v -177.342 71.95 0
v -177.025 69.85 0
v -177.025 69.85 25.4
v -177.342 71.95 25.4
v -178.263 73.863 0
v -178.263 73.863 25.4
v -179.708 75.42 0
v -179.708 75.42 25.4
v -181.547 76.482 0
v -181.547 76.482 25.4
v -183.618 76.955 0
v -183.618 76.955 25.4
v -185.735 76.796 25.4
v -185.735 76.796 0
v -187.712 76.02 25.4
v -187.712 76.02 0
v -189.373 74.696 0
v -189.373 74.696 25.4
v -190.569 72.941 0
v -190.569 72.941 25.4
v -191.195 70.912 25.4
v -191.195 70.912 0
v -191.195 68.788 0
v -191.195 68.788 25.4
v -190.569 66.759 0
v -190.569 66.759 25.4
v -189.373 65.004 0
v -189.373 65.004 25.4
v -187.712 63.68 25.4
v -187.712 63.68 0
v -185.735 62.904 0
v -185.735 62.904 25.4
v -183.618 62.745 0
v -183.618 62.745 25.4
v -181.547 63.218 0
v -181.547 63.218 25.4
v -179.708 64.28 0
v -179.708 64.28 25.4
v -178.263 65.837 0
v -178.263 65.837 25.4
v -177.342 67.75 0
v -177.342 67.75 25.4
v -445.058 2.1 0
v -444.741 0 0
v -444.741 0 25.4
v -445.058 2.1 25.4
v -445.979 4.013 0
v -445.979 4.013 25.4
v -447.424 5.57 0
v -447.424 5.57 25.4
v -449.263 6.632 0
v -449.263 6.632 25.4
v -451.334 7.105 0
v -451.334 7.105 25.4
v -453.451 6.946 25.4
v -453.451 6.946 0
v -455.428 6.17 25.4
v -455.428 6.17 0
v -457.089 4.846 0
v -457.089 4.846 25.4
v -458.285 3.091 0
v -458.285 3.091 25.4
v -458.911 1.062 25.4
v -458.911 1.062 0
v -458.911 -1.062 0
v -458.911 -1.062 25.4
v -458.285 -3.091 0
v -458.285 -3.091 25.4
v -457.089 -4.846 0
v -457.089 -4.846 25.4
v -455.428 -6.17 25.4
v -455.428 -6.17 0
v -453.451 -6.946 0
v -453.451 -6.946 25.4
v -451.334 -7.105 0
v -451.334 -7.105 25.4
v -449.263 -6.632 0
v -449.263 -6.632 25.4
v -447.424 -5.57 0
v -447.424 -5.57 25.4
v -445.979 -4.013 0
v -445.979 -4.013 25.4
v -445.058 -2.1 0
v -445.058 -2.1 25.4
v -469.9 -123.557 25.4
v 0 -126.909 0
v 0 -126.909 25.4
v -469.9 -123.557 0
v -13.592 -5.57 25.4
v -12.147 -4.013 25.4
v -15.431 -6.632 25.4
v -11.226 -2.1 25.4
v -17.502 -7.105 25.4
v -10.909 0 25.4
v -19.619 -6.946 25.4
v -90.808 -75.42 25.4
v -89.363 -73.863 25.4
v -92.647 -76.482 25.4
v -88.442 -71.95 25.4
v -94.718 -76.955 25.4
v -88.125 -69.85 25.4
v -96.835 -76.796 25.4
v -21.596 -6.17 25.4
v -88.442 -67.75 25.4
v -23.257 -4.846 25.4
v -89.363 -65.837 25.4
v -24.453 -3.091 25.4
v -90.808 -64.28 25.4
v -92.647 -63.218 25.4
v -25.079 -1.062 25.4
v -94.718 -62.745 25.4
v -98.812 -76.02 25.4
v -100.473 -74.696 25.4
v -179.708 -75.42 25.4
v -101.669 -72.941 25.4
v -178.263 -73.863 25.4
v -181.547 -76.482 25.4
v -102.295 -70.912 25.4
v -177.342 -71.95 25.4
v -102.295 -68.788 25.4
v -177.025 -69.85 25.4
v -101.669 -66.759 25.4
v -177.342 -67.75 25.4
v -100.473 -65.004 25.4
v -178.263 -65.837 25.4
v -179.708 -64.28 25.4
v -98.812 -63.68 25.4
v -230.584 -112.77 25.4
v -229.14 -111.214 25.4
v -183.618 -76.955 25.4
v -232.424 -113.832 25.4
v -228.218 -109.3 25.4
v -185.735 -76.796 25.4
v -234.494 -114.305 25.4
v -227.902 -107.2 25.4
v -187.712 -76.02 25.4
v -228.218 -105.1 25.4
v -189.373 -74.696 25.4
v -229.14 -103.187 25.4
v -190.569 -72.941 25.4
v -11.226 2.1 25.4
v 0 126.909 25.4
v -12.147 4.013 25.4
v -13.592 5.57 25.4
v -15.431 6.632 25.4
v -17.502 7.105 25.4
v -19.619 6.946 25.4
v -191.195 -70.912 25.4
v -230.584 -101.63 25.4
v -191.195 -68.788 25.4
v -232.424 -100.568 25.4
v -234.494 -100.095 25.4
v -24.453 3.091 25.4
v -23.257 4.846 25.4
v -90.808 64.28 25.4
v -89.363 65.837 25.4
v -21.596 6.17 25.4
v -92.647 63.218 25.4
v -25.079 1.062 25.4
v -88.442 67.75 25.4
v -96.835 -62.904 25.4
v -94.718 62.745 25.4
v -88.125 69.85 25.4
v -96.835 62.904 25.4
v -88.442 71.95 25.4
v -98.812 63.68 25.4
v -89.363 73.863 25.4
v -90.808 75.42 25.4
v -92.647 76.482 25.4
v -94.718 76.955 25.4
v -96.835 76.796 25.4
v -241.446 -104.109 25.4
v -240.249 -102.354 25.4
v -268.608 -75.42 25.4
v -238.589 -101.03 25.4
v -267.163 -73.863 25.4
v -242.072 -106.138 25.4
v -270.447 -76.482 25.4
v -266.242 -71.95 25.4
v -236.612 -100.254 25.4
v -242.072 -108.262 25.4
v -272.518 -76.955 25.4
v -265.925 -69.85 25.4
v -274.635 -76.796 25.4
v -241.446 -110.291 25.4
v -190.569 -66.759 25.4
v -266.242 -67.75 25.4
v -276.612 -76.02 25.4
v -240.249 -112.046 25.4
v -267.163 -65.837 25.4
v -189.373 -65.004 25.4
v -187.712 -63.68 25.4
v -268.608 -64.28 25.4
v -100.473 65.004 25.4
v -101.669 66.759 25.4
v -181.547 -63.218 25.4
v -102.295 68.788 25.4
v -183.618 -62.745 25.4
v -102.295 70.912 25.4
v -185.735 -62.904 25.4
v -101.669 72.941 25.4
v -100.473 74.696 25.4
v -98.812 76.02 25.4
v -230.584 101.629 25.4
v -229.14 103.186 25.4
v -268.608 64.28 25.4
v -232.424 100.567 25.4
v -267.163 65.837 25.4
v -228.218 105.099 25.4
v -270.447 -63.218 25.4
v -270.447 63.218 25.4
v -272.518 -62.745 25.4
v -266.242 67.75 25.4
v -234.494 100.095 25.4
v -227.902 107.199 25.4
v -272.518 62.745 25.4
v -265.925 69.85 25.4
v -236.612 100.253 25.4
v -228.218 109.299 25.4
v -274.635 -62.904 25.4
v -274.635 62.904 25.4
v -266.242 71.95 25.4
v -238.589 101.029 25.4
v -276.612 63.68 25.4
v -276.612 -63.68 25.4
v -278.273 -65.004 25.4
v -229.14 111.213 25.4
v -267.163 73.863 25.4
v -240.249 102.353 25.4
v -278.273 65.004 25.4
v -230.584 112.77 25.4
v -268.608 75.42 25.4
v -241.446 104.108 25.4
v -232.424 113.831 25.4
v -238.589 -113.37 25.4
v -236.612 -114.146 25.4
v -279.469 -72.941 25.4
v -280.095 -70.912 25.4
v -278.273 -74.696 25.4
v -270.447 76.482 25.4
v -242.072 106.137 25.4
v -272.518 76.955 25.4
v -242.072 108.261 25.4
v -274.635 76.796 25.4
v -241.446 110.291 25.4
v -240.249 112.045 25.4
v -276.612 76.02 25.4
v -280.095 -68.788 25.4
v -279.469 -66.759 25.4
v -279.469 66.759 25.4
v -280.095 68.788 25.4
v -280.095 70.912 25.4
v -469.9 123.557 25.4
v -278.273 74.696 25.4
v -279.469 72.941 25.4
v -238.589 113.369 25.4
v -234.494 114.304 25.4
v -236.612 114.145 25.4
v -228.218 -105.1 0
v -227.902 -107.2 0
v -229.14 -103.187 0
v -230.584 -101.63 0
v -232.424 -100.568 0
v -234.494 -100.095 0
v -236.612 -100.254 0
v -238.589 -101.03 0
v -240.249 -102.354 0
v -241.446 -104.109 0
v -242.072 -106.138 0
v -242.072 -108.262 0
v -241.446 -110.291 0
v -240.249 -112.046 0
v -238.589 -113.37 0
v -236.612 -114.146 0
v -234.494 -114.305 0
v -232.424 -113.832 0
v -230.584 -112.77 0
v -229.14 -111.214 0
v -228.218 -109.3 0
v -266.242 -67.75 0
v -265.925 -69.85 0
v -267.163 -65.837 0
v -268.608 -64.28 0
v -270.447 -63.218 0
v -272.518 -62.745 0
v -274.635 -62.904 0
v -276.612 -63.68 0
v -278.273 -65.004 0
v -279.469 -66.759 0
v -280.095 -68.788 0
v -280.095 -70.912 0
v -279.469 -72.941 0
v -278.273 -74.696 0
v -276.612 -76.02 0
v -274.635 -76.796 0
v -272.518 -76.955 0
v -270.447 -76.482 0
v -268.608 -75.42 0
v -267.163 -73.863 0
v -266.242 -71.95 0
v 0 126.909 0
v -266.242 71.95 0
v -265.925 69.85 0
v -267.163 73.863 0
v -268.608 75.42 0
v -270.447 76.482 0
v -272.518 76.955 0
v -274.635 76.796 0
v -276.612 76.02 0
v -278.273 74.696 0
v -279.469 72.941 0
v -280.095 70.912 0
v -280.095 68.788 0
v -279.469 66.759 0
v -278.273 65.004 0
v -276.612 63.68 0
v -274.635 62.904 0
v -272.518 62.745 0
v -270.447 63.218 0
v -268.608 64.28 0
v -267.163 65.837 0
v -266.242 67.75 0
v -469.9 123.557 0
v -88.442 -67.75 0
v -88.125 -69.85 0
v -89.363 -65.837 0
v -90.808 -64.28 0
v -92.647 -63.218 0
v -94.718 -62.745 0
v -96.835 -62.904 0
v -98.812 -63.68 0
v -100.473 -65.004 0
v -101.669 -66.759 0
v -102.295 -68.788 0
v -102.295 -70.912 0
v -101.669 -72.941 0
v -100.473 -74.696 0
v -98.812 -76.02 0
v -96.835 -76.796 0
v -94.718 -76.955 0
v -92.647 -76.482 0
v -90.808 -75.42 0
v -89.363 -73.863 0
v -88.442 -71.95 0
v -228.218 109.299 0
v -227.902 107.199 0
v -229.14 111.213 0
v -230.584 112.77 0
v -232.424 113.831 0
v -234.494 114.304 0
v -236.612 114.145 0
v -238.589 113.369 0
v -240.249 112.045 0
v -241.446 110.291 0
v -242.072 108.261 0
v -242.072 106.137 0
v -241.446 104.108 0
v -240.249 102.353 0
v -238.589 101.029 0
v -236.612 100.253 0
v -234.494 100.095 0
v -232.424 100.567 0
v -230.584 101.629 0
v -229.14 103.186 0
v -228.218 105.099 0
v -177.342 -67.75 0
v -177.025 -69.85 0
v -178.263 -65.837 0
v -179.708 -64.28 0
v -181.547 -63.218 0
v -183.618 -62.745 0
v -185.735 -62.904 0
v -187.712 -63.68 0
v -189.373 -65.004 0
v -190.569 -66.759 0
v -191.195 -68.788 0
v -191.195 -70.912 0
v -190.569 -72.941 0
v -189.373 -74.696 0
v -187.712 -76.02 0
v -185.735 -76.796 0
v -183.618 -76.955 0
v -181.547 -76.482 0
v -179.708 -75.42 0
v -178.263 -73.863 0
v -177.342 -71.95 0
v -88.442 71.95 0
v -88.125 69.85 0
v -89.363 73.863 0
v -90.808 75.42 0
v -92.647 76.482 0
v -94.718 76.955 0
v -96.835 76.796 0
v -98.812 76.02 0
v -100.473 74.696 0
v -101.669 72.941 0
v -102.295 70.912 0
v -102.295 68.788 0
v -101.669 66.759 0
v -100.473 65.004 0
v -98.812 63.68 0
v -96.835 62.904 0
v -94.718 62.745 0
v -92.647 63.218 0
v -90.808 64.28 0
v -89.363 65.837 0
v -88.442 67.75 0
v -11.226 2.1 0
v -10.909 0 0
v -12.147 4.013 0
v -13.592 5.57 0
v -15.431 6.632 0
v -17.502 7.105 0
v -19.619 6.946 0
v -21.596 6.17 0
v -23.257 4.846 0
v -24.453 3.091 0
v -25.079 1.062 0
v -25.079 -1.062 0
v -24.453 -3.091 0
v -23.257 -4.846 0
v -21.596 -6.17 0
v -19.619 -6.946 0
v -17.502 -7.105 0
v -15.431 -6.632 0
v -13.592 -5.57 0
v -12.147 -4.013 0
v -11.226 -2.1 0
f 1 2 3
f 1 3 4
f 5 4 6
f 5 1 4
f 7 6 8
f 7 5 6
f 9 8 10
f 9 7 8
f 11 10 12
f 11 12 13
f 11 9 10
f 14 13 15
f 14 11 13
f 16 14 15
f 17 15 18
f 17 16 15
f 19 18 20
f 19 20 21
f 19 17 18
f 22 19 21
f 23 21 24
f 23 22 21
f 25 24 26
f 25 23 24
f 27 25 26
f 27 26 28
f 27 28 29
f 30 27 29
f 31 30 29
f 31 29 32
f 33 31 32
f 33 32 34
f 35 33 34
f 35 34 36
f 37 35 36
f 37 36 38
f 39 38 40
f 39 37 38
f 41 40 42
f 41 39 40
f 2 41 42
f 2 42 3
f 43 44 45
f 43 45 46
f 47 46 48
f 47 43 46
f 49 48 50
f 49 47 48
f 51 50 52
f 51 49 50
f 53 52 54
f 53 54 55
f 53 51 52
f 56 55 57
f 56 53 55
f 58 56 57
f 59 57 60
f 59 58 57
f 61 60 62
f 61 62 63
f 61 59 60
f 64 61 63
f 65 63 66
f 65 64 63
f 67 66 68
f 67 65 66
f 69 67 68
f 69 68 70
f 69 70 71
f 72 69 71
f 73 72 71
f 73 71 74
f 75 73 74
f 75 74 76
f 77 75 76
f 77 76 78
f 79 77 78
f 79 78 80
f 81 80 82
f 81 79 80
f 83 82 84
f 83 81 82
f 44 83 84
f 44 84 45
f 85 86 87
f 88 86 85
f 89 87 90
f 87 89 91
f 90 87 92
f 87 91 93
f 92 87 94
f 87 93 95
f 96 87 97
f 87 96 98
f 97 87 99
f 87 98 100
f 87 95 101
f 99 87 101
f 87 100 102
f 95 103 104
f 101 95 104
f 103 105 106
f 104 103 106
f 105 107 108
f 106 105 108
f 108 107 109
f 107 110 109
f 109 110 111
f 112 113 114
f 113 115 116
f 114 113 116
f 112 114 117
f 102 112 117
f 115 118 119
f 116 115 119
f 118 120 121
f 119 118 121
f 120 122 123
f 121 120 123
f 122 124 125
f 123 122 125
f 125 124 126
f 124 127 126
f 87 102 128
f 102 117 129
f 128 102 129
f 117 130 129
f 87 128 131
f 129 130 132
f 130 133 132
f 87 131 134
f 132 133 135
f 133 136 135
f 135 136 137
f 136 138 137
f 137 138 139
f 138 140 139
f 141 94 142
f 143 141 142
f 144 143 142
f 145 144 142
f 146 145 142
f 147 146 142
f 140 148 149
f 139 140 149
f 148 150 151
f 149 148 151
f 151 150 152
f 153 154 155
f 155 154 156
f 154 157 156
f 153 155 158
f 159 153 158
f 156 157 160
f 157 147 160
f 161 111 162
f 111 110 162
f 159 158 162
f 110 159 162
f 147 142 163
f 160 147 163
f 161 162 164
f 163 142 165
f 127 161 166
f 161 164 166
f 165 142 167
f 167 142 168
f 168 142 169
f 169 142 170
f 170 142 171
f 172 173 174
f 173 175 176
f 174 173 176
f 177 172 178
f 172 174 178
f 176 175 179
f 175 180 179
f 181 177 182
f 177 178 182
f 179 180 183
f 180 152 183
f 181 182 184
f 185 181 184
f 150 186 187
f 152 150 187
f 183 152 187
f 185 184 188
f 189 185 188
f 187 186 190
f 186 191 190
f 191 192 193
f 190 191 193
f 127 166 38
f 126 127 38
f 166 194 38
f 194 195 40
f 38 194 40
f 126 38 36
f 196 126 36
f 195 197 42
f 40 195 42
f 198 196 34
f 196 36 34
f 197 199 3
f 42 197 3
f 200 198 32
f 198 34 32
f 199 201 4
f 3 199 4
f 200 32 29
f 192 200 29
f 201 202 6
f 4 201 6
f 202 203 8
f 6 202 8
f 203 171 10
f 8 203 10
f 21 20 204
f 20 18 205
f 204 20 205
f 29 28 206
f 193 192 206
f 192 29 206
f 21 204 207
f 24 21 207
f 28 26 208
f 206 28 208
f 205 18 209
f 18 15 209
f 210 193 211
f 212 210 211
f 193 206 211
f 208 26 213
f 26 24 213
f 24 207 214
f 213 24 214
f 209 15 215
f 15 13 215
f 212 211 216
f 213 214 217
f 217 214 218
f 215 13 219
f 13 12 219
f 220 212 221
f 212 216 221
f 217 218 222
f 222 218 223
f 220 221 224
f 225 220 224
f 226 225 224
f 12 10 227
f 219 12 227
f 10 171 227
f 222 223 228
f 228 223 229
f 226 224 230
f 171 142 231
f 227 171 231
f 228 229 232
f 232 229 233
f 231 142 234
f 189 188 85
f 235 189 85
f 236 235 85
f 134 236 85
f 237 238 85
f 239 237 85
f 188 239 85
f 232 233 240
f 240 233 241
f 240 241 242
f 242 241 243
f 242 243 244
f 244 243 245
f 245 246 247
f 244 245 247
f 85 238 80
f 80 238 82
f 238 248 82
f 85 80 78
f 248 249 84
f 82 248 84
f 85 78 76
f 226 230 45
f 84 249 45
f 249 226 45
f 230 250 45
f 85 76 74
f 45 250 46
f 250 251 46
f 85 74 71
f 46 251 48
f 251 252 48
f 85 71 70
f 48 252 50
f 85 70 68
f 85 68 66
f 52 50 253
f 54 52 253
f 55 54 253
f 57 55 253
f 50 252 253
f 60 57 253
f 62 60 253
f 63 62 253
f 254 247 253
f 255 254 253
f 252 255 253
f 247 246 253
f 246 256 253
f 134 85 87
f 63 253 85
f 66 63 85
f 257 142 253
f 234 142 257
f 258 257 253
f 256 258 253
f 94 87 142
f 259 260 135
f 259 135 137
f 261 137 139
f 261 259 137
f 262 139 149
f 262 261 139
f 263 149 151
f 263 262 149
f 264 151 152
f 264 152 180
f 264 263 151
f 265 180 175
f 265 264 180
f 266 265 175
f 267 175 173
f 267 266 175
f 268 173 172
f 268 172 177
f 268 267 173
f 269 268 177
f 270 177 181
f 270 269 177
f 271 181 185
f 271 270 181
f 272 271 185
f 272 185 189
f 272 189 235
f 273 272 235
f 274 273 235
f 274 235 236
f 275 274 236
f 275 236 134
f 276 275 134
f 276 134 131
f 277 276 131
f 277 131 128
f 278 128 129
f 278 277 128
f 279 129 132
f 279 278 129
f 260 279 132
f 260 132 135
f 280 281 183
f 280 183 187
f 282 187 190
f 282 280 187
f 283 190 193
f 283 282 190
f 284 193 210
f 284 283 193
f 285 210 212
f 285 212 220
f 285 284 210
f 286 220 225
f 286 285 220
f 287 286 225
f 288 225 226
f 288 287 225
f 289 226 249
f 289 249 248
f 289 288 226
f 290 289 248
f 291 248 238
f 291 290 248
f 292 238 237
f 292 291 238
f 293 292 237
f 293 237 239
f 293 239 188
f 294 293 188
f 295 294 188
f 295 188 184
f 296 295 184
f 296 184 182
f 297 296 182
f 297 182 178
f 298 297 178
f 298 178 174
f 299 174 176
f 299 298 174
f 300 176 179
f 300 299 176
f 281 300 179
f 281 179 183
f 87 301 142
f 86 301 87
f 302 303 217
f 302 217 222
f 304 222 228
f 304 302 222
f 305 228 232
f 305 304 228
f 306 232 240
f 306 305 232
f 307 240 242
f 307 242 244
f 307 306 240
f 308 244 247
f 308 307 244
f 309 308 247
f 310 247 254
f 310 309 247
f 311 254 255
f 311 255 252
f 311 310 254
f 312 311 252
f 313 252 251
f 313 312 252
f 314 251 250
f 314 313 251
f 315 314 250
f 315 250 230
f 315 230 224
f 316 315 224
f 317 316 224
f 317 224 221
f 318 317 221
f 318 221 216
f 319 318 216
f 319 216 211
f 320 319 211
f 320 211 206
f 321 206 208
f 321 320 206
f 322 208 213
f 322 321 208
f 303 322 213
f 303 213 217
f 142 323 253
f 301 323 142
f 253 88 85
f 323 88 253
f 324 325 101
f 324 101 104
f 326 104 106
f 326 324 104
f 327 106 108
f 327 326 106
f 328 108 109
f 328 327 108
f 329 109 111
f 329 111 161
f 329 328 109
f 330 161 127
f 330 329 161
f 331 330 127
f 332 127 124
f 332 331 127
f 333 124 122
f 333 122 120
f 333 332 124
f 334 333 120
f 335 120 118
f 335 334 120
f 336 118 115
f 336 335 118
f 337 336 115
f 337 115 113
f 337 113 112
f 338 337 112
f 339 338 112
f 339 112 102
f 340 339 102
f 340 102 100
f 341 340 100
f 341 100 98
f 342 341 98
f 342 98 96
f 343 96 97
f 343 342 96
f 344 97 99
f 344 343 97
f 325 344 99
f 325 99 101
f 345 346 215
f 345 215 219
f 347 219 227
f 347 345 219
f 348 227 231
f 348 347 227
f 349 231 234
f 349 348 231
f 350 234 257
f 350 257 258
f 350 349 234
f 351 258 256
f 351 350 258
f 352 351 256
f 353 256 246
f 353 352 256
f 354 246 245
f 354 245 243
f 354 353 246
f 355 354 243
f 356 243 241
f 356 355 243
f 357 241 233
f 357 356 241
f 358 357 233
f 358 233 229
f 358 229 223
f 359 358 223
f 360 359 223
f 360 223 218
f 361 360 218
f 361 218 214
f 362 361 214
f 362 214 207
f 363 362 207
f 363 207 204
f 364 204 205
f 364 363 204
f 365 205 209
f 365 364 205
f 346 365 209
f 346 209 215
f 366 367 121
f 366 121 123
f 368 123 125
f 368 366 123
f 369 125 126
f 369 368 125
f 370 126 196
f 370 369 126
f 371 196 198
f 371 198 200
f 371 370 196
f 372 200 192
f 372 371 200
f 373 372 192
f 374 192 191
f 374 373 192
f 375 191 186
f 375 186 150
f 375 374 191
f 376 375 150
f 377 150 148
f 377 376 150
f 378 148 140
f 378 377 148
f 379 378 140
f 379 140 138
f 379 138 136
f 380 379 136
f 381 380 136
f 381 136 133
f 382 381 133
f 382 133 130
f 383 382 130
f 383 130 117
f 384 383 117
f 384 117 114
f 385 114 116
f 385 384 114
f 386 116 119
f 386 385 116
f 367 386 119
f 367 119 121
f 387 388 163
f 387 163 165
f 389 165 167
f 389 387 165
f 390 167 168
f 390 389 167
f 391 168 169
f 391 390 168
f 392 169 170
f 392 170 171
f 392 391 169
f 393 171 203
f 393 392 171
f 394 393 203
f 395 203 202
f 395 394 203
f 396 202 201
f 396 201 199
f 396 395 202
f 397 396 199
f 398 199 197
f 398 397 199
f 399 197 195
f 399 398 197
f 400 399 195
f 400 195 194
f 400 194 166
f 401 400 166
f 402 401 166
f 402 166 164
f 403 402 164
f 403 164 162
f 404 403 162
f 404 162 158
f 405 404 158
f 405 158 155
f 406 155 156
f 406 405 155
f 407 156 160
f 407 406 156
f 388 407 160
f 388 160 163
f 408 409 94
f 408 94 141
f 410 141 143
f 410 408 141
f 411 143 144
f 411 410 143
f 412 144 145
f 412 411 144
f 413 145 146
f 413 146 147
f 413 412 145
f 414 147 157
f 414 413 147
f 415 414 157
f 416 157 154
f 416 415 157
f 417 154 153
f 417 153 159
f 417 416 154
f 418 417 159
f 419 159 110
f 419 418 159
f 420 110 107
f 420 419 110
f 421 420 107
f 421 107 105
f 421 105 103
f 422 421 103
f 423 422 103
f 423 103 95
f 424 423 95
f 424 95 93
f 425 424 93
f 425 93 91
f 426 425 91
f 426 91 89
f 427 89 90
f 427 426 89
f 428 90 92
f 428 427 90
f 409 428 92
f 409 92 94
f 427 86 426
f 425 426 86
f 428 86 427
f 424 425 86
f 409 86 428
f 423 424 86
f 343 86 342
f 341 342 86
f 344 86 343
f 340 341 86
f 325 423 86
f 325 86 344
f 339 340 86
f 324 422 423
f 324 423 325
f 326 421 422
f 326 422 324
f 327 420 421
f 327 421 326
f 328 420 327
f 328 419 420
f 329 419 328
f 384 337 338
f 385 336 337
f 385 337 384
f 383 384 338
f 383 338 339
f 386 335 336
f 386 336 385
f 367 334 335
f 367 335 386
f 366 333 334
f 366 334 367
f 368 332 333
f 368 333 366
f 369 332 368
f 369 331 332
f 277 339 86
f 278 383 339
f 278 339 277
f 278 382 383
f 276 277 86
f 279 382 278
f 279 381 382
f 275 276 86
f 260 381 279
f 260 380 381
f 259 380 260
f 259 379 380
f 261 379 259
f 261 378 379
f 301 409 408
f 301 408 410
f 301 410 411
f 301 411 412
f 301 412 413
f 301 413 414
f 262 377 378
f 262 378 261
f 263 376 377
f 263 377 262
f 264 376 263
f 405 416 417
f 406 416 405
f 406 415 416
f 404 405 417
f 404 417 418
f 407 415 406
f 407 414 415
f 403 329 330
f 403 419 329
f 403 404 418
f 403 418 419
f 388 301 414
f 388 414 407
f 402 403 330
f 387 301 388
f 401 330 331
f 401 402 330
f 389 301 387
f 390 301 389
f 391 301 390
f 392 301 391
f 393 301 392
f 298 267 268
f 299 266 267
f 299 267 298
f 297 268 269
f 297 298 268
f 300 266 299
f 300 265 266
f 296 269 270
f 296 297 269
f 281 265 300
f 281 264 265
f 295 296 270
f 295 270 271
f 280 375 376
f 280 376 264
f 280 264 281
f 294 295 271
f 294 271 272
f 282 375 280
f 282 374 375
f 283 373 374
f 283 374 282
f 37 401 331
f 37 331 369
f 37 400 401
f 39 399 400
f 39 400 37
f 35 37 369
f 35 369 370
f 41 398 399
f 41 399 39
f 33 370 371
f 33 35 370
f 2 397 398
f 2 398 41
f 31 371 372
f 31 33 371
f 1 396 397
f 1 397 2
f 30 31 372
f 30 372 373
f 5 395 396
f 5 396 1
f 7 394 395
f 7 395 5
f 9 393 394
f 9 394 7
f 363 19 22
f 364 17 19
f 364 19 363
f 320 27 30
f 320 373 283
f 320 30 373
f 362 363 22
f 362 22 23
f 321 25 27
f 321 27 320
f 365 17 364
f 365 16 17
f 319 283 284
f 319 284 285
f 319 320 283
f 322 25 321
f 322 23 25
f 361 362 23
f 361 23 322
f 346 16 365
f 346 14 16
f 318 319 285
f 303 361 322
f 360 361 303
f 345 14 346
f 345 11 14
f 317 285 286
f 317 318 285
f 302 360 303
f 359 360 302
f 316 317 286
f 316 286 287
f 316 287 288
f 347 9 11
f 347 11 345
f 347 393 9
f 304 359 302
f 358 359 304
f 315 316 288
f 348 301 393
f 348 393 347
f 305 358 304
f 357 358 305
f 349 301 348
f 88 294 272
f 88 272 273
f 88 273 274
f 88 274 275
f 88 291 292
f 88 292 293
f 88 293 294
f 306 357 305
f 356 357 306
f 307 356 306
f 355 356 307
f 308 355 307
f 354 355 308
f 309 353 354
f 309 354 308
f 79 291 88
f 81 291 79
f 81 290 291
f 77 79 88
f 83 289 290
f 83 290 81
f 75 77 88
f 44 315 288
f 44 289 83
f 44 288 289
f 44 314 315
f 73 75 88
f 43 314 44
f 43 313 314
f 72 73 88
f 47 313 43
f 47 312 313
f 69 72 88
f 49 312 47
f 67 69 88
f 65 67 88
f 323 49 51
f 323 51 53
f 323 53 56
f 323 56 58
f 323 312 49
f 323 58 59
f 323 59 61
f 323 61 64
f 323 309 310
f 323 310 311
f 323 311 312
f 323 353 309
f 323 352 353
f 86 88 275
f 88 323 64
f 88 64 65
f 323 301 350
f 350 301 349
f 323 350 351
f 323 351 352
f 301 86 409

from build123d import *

# Parameters (mm, degrees)
BOSS_EXTRUDE2_DEPTH = 25.4
SKETCH2_R           = 7.1247
CUT_EXTRUDE1_DEPTH  = 25.4
SKETCH2_3_R         = 7.1247
CUT_EXTRUDE2_DEPTH  = 25.4
SKETCH2_4_R         = 7.1247
CUT_EXTRUDE3_DEPTH  = 25.4
SKETCH2_5_R         = 7.1247
CUT_EXTRUDE4_DEPTH  = 25.4
SKETCH2_6_R         = 7.1247
CUT_EXTRUDE5_DEPTH  = 25.4
SKETCH2_7_R         = 7.1247
CUT_EXTRUDE6_DEPTH  = 25.4
SKETCH2_8_R         = 7.1247
CUT_EXTRUDE7_DEPTH  = 25.4
SKETCH2_9_R         = 7.1247
CUT_EXTRUDE8_DEPTH  = 25.4
SKETCH2_10_R        = 7.1247
CUT_EXTRUDE9_DEPTH  = 25.4
SKETCH2_11_R        = 7.1247
CUT_EXTRUDE10_DEPTH = 25.4


with BuildPart() as part:
    # Pedal Box Floor → Boss-Extrude2 (new body)
    with BuildSketch(Plane.XY):
        Polygon((0, -126.908753769), (-469.9, -123.556557293), (-469.9, 123.556557293), (0, 126.908753769), align=None)
    extrude(amount=BOSS_EXTRUDE2_DEPTH)

    # Sketch2 → Cut-Extrude1 (cut)
    with BuildSketch(Plane.XY):
        with Locations((-235.026595282, 107.199301857)):
            Circle(SKETCH2_R)
    extrude(amount=CUT_EXTRUDE1_DEPTH, mode=Mode.SUBTRACT)

    # Sketch2<3> → Cut-Extrude2 (cut)
    with BuildSketch(Plane.XY):
        with Locations((-18.034, 0)):
            Circle(SKETCH2_3_R)
    extrude(amount=CUT_EXTRUDE2_DEPTH, mode=Mode.SUBTRACT)

    # Sketch2<4> → Cut-Extrude3 (cut)
    with BuildSketch(Plane.XY):
        with Locations((-451.866, 0)):
            Circle(SKETCH2_4_R)
    extrude(amount=CUT_EXTRUDE3_DEPTH, mode=Mode.SUBTRACT)

    # Sketch2<5> → Cut-Extrude4 (cut)
    with BuildSketch(Plane.XY):
        with Locations((-235.026595282, -107.200076916)):
            Circle(SKETCH2_5_R)
    extrude(amount=CUT_EXTRUDE4_DEPTH, mode=Mode.SUBTRACT)

    # Sketch2<6> → Cut-Extrude5 (cut)
    with BuildSketch(Plane.XY):
        with Locations((-273.05, -69.85)):
            Circle(SKETCH2_6_R)
    extrude(amount=CUT_EXTRUDE5_DEPTH, mode=Mode.SUBTRACT)

    # Sketch2<7> → Cut-Extrude6 (cut)
    with BuildSketch(Plane.XY):
        with Locations((-184.15, -69.85)):
            Circle(SKETCH2_7_R)
    extrude(amount=CUT_EXTRUDE6_DEPTH, mode=Mode.SUBTRACT)

    # Sketch2<8> → Cut-Extrude7 (cut)
    with BuildSketch(Plane.XY):
        with Locations((-95.25, -69.85)):
            Circle(SKETCH2_8_R)
    extrude(amount=CUT_EXTRUDE7_DEPTH, mode=Mode.SUBTRACT)

    # Sketch2<9> → Cut-Extrude8 (cut)
    with BuildSketch(Plane.XY):
        with Locations((-273.05, 69.85)):
            Circle(SKETCH2_9_R)
    extrude(amount=CUT_EXTRUDE8_DEPTH, mode=Mode.SUBTRACT)

    # Sketch2<10> → Cut-Extrude9 (cut)
    with BuildSketch(Plane.XY):
        with Locations((-184.15, 69.85)):
            Circle(SKETCH2_10_R)
    extrude(amount=CUT_EXTRUDE9_DEPTH, mode=Mode.SUBTRACT)

    # Sketch2<11> → Cut-Extrude10 (cut)
    with BuildSketch(Plane.XY):
        with Locations((-95.25, 69.85)):
            Circle(SKETCH2_11_R)
    extrude(amount=CUT_EXTRUDE10_DEPTH, mode=Mode.SUBTRACT)


solid = part.part
